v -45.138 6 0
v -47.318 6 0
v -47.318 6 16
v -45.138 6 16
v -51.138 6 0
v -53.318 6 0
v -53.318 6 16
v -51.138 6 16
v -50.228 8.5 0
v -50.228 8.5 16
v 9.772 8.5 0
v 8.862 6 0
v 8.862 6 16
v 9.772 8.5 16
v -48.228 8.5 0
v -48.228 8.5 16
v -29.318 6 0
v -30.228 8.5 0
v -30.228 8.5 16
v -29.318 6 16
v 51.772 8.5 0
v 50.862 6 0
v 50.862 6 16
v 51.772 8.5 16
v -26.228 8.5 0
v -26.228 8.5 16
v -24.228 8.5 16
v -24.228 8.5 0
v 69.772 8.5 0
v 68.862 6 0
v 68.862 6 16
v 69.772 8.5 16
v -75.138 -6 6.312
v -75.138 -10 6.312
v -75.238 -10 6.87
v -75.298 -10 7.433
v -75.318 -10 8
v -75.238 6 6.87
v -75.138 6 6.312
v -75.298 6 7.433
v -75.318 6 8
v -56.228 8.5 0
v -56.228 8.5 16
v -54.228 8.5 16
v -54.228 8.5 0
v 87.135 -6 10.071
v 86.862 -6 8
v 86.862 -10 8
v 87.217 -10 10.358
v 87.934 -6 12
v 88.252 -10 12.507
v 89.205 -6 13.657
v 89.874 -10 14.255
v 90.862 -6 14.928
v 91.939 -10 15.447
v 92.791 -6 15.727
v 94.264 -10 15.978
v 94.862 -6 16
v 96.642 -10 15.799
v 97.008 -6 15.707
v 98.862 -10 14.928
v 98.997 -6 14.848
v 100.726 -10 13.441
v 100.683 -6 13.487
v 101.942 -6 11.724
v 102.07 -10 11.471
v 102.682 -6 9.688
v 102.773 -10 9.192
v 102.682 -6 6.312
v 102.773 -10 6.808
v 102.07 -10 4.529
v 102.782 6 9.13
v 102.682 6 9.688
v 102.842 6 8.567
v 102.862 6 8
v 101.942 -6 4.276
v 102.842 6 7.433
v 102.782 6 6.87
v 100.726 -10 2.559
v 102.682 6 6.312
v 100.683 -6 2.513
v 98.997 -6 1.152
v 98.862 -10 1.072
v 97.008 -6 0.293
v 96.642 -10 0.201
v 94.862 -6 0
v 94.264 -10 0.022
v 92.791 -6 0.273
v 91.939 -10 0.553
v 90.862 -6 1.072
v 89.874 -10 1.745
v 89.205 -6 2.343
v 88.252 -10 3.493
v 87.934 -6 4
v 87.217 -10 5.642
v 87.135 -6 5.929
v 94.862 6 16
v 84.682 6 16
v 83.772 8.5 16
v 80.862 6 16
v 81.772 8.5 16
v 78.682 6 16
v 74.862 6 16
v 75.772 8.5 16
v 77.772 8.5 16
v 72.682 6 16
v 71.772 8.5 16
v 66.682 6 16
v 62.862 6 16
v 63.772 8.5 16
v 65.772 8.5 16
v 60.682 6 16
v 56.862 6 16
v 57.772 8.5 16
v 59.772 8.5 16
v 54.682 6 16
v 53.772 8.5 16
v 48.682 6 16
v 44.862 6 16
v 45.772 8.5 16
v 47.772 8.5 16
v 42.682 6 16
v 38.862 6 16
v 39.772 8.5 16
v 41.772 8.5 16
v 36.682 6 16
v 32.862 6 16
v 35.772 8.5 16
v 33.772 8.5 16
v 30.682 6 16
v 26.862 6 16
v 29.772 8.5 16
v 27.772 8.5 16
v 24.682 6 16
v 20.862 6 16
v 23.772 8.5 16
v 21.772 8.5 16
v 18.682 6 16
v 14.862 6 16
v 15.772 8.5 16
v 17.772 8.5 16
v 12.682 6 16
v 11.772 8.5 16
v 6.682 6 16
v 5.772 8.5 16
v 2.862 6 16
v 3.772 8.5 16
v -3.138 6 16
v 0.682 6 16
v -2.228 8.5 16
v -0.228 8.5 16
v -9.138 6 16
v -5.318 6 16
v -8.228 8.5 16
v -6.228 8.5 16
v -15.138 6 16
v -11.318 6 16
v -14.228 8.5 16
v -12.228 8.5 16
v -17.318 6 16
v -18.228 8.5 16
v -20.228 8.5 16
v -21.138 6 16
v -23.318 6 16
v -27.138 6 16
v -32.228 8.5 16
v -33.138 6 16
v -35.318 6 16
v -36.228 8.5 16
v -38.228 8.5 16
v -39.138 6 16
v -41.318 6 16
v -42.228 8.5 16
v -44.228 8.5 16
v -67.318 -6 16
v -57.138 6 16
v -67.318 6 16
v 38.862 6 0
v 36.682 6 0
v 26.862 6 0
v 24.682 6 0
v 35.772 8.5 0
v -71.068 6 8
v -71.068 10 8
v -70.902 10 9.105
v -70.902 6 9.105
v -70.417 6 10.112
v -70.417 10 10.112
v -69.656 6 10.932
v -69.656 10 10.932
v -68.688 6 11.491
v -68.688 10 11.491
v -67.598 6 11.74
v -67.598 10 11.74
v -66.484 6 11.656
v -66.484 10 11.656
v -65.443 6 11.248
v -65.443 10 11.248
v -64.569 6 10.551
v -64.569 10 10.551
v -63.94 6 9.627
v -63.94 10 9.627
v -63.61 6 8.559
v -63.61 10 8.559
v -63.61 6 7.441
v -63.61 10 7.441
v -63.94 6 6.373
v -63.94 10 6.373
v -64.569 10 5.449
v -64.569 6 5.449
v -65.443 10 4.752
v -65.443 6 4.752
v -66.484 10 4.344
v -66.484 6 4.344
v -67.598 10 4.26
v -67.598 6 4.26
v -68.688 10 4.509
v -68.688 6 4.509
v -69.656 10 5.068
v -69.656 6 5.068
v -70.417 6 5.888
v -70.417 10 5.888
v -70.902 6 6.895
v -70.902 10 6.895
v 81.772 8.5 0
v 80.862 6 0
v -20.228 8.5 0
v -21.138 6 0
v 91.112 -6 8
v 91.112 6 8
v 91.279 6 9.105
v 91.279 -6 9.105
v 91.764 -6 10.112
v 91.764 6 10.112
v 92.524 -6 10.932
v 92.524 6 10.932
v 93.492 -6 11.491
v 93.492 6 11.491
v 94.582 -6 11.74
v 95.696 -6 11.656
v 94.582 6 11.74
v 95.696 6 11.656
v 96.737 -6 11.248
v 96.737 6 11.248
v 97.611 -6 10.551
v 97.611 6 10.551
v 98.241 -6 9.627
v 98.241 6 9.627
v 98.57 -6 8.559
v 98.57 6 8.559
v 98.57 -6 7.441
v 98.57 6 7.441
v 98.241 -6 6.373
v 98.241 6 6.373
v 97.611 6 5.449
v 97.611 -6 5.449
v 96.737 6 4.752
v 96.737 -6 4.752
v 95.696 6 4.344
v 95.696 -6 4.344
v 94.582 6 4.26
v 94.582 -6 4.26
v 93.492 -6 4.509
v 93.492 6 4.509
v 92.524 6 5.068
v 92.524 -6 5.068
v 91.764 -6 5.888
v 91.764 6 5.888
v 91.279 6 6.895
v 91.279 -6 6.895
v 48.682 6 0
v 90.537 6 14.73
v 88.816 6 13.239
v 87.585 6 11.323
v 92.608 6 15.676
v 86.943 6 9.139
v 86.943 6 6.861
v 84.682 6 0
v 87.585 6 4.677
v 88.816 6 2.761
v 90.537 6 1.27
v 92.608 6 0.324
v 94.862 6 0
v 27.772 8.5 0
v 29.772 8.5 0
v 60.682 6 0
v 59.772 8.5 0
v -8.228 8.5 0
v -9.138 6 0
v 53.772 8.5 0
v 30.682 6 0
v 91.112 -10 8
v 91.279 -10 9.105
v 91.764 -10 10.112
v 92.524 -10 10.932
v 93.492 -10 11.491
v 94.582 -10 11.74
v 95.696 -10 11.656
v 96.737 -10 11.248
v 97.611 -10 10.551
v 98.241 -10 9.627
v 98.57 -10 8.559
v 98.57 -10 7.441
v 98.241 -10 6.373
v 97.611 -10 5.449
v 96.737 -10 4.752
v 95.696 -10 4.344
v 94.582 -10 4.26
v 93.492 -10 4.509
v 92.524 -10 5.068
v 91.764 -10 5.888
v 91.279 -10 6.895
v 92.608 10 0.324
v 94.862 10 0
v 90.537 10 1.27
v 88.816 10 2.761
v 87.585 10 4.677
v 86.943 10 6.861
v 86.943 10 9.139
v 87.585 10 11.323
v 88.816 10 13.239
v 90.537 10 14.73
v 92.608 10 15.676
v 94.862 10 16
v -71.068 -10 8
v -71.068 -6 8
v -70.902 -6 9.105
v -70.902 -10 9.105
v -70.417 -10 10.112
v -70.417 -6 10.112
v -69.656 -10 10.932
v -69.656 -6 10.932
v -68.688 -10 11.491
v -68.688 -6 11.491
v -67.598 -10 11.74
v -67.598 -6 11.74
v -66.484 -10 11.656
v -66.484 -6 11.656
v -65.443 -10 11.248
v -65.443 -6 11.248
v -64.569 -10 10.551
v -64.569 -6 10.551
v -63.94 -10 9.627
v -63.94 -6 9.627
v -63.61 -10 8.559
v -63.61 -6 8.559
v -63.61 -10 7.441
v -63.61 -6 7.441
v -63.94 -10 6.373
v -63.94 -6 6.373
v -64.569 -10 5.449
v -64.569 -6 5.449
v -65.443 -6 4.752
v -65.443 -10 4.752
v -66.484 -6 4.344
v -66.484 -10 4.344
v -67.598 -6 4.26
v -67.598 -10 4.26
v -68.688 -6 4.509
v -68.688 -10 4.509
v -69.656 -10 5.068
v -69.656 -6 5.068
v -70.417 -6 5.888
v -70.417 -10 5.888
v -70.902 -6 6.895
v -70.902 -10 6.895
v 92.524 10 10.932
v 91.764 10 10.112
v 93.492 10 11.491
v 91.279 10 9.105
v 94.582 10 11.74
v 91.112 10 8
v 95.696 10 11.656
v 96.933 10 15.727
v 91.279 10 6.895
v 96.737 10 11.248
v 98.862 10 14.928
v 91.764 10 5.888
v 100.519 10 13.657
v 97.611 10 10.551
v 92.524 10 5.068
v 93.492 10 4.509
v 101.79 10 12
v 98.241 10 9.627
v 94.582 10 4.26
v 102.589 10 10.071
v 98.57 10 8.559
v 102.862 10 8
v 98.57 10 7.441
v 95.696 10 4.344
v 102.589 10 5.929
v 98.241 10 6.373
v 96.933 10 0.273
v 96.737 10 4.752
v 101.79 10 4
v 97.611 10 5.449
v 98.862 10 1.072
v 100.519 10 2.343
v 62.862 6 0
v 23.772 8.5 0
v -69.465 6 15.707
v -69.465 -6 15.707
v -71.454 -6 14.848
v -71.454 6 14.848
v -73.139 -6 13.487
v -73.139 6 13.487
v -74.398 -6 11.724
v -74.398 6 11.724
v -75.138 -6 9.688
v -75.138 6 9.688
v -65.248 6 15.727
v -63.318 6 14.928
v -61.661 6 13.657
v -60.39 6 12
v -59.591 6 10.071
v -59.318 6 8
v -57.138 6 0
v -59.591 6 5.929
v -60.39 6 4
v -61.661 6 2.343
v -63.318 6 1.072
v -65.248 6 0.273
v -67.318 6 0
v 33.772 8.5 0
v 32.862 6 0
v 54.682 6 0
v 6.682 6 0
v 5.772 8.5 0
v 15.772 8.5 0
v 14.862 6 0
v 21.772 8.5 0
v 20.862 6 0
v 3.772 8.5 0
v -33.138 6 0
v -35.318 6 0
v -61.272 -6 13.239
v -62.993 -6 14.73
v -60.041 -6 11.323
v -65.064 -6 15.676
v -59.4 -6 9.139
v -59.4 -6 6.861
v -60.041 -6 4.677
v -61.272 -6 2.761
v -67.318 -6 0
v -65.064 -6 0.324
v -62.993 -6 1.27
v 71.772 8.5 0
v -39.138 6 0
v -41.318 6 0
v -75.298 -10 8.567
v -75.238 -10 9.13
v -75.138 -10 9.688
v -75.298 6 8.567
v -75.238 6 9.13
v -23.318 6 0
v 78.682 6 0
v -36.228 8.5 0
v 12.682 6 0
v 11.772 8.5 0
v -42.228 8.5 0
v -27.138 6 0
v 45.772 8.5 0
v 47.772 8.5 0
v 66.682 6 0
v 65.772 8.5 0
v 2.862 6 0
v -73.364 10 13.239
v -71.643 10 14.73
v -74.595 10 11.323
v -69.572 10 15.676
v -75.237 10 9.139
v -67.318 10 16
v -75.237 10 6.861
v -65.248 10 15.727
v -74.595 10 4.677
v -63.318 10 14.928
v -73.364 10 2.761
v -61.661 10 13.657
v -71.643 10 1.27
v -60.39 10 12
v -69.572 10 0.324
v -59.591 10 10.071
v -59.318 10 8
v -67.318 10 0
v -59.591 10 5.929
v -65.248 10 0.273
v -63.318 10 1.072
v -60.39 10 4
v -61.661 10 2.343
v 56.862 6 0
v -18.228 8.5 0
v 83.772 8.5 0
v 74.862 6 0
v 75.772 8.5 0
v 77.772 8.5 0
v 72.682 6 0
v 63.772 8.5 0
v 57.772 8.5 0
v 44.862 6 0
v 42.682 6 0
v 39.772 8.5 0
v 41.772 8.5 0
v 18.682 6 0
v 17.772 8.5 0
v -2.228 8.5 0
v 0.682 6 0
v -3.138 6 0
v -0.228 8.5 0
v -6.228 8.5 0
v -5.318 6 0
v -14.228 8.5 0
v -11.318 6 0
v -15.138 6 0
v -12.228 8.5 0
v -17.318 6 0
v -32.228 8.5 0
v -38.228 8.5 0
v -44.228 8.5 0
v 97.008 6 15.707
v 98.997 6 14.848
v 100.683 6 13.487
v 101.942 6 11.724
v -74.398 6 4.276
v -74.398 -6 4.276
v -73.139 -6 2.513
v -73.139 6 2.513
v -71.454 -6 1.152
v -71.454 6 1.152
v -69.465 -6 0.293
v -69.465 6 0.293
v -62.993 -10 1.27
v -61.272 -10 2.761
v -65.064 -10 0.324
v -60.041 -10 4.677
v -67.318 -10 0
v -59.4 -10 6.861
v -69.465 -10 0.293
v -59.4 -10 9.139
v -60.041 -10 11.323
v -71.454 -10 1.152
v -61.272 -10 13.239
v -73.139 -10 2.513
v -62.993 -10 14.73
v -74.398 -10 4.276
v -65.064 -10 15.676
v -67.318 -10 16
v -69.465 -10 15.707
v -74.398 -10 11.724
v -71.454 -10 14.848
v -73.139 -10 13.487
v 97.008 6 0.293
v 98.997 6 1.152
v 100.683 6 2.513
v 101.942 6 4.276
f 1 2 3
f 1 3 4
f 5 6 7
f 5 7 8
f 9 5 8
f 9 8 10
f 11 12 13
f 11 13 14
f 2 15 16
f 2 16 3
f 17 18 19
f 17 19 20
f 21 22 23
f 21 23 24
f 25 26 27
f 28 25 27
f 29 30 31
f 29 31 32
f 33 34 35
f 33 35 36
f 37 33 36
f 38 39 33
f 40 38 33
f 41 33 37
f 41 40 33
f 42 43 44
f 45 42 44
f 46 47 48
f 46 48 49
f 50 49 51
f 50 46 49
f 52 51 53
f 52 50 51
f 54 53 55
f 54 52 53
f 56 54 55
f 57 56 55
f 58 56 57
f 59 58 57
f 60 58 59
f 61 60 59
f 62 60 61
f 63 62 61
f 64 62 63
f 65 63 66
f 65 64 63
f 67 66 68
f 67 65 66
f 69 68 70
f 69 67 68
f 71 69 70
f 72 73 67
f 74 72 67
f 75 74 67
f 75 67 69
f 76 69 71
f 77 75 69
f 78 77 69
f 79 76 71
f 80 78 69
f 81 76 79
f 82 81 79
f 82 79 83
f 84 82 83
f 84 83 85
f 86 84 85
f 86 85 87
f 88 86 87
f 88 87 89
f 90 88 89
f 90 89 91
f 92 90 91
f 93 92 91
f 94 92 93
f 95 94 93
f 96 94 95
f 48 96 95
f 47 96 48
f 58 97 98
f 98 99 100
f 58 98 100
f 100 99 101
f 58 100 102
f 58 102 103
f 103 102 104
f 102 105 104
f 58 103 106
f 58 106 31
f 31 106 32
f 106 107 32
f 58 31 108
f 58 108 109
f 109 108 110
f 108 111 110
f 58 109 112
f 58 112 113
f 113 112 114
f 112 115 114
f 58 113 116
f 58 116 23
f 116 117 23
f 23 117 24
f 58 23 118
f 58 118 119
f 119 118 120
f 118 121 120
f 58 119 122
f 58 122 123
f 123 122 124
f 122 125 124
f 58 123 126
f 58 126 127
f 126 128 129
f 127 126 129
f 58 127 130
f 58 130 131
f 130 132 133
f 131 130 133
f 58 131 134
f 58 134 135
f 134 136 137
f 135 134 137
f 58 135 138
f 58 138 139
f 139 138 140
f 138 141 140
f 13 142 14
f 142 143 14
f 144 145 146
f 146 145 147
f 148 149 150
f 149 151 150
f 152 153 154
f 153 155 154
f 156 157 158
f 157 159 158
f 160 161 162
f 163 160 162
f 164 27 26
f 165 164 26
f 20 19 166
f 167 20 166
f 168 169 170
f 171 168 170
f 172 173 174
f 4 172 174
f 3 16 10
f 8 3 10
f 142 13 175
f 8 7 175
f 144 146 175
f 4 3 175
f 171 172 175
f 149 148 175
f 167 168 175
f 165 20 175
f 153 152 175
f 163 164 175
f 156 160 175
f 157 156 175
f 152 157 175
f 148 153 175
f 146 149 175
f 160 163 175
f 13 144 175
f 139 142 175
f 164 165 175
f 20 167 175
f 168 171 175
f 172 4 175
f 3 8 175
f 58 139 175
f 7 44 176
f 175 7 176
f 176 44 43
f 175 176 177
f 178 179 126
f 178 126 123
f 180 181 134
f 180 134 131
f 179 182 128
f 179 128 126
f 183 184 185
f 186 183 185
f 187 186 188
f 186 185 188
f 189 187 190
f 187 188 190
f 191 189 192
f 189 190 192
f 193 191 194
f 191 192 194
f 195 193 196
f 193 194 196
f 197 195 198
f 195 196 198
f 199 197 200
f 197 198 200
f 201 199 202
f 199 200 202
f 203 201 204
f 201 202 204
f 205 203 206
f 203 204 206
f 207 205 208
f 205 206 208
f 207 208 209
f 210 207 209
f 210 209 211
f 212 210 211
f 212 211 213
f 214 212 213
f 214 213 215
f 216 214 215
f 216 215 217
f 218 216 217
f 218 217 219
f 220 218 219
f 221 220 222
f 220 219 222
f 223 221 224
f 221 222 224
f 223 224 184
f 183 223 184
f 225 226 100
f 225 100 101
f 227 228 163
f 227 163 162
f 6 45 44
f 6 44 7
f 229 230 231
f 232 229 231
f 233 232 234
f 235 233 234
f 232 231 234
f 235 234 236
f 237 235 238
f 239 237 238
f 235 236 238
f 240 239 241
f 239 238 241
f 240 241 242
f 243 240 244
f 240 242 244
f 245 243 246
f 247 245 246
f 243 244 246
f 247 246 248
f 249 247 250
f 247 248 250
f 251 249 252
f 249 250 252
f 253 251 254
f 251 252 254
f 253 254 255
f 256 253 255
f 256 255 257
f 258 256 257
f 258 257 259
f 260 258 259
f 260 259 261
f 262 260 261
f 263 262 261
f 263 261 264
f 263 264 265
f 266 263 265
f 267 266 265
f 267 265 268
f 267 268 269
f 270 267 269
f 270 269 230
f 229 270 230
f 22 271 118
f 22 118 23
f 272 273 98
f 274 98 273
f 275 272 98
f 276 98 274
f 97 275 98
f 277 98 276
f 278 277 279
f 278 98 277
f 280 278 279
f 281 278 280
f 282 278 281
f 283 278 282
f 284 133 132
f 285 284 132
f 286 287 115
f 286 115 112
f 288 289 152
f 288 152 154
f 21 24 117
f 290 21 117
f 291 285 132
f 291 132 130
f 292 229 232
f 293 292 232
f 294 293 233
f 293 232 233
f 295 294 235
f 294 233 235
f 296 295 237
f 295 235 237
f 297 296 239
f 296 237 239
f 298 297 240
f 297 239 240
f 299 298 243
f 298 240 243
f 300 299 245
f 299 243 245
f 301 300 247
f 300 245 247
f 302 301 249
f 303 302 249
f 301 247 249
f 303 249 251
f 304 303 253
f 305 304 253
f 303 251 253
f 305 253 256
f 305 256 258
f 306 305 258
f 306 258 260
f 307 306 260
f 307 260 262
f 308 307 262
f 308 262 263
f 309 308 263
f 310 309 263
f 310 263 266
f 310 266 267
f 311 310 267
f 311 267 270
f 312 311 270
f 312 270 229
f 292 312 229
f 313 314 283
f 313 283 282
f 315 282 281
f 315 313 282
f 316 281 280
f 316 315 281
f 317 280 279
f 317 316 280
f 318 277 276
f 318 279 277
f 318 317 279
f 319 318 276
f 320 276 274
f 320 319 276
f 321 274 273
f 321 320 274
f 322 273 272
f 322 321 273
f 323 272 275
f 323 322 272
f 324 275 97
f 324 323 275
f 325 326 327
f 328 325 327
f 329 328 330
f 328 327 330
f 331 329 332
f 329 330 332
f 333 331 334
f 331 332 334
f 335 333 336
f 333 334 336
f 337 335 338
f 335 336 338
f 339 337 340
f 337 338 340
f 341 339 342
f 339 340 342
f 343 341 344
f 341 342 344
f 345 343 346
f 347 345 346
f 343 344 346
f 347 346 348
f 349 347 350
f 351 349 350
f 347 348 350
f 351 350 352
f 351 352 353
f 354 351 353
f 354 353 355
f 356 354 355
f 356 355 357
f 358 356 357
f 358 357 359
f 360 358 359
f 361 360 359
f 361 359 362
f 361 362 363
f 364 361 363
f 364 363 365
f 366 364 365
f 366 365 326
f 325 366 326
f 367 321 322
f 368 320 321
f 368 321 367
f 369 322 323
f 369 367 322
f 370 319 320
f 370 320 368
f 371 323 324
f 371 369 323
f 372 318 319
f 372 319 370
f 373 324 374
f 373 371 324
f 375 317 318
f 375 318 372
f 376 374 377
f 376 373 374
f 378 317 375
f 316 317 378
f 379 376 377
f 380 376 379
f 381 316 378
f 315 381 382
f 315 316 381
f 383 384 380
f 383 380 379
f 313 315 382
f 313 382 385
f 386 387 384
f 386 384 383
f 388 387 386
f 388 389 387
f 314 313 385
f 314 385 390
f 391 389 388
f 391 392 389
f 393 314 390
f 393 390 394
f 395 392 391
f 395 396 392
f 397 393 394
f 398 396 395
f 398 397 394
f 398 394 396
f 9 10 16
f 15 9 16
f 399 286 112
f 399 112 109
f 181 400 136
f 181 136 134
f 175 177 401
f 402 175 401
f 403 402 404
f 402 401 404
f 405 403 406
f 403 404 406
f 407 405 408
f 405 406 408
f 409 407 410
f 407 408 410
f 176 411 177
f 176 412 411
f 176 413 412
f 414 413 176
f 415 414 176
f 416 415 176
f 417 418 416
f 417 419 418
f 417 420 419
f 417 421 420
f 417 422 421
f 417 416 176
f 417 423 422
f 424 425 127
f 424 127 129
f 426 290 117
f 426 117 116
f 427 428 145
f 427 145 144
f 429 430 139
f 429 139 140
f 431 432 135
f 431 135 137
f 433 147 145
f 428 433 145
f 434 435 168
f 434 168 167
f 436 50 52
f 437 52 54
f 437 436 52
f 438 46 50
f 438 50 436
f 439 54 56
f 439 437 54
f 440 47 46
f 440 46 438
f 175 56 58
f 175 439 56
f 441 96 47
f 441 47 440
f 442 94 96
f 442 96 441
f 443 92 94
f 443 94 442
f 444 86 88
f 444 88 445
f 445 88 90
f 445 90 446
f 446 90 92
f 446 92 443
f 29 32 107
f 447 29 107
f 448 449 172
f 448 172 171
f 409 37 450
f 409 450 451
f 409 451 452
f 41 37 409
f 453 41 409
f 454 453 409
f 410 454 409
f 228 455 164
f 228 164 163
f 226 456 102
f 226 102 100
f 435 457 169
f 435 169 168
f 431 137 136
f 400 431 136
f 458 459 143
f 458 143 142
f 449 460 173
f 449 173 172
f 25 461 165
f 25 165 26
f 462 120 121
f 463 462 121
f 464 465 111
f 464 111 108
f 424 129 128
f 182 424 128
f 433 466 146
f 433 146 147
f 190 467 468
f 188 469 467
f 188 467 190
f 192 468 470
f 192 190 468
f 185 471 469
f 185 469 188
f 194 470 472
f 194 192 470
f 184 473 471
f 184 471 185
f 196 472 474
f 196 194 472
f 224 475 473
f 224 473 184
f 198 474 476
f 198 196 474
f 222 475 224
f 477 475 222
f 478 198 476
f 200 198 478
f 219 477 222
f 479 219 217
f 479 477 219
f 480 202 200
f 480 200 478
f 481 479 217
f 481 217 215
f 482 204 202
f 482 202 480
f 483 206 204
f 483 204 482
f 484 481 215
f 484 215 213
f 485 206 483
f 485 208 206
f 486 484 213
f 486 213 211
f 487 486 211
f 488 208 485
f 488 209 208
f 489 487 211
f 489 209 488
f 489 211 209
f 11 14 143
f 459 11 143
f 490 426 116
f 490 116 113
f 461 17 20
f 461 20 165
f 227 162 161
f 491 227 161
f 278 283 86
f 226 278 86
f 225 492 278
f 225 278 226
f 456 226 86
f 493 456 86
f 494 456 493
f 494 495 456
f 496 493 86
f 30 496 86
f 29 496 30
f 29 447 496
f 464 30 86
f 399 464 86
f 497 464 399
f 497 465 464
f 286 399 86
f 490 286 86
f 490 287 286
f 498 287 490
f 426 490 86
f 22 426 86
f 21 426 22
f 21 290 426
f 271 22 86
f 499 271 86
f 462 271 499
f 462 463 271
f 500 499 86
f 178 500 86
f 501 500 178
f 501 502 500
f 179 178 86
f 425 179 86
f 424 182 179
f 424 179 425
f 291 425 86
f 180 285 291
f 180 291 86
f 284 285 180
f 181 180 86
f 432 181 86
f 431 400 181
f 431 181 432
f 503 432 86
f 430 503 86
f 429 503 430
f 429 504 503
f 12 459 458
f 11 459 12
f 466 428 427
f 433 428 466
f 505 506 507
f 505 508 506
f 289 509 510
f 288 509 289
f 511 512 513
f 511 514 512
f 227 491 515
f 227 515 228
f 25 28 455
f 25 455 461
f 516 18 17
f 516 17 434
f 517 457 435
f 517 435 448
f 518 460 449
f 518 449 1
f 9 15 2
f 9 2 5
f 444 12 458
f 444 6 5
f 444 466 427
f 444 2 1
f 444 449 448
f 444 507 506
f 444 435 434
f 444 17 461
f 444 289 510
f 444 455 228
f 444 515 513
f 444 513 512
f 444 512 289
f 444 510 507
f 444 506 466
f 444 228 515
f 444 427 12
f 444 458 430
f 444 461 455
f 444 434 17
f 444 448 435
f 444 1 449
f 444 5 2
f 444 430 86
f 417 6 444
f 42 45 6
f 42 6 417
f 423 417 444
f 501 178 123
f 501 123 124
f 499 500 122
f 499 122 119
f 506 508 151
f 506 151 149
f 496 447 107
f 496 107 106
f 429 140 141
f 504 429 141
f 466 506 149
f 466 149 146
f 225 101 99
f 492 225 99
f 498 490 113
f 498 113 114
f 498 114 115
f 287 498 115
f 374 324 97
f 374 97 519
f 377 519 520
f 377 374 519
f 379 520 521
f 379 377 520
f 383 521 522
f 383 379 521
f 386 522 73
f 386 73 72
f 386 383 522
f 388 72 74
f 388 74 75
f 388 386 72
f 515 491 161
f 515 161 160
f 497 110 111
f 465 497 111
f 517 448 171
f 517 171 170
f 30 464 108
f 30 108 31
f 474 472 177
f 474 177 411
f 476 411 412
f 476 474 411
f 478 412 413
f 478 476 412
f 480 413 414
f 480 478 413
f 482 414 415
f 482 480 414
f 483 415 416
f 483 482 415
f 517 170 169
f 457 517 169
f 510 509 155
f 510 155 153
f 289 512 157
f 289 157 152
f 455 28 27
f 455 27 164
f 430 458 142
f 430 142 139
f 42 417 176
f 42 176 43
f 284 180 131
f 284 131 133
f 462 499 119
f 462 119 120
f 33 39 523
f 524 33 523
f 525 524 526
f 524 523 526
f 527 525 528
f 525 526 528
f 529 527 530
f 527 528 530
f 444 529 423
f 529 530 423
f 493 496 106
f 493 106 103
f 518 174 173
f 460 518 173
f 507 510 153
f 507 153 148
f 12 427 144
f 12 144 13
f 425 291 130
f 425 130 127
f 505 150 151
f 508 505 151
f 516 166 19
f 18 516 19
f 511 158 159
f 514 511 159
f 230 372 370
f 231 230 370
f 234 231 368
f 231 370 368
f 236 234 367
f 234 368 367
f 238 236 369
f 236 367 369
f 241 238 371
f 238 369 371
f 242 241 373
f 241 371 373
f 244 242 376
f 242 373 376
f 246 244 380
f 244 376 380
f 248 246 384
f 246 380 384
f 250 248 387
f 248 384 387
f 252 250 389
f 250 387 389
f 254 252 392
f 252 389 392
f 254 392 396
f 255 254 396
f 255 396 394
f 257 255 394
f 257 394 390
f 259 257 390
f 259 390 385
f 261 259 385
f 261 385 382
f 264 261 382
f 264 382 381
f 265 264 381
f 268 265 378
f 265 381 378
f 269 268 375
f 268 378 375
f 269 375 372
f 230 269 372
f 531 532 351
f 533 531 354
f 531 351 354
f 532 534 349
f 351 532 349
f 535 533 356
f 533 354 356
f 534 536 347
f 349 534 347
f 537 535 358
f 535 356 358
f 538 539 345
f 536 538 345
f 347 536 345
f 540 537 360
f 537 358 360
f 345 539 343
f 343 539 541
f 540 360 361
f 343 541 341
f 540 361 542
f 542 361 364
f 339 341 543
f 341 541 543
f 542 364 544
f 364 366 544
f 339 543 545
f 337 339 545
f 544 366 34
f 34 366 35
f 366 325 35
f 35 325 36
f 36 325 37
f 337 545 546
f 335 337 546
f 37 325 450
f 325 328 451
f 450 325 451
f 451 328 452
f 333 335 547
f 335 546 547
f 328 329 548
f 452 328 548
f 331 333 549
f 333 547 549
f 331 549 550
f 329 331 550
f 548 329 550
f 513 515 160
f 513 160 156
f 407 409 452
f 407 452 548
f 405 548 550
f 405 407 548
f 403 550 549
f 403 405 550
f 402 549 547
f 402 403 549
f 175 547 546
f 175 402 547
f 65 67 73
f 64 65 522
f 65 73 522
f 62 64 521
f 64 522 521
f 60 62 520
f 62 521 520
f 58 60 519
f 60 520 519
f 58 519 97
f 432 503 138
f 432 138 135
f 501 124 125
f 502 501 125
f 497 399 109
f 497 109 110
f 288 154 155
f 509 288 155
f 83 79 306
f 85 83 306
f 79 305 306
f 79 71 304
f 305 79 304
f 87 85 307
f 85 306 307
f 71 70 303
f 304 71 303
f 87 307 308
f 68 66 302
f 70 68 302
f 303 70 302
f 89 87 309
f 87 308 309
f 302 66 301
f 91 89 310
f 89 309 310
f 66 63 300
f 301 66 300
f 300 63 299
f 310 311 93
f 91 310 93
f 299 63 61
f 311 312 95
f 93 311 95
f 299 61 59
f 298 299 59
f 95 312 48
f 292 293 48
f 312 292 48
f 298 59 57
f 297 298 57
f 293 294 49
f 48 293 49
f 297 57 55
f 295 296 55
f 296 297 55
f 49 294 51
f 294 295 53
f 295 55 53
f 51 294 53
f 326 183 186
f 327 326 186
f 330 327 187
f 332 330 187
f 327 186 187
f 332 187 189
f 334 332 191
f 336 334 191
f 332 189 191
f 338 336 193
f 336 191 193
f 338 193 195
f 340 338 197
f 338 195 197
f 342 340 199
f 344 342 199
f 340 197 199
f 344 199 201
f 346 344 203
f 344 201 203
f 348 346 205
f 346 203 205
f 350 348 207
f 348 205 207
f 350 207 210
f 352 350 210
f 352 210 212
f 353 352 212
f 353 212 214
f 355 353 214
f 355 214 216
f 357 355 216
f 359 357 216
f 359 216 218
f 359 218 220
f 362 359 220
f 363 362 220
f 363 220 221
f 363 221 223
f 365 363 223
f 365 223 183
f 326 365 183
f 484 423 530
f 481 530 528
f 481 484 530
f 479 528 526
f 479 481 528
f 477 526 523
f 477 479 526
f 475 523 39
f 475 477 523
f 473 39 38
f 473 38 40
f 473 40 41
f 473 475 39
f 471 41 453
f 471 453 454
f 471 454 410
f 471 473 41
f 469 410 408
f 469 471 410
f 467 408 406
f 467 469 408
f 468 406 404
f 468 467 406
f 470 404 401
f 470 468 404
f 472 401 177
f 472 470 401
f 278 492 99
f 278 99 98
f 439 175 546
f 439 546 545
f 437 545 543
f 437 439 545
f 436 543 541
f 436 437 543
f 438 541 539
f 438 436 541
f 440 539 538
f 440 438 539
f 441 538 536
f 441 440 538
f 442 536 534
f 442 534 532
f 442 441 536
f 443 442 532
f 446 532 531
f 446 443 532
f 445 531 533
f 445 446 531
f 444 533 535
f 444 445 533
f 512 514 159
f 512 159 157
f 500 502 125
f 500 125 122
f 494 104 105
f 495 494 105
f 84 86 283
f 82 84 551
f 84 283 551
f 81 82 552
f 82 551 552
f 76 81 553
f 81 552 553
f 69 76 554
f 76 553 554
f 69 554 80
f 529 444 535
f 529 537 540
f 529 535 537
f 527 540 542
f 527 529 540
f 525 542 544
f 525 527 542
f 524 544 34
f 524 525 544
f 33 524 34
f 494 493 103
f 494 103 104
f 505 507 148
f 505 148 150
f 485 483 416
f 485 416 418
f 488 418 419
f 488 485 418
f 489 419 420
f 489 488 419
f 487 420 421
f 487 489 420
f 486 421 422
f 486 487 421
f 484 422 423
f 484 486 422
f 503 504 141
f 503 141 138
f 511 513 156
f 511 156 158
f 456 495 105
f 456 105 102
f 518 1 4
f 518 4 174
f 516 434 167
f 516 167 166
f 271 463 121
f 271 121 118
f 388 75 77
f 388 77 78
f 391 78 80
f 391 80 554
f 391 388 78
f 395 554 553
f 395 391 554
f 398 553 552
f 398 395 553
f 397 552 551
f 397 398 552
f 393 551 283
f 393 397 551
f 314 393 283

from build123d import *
from build123d.topology import SkipClean

# Parameters (mm, degrees)
BOSS_EXTRUDE1_DEPTH = 16
SKETCH3_R           = 3.75
CUT_EXTRUDE1_DEPTH  = 16
SKETCH4_R           = 8
SKETCH4_R_2         = 3.75
BOSS_EXTRUDE2_DEPTH = 16
BOSS_EXTRUDE3_START = 4
SKETCH5_R           = 3.75
BOSS_EXTRUDE3_DEPTH = 4
SKETCH6_R           = 8
SKETCH6_R_2         = 3.75
BOSS_EXTRUDE4_DEPTH = 16
SKETCH7_R           = 3.75
CUT_EXTRUDE2_DEPTH  = 16
BOSS_EXTRUDE5_START = 4
SKETCH8_R           = 3.75
BOSS_EXTRUDE5_DEPTH = 4


with BuildPart() as part:
    # Sketch1 → Boss-Extrude1 (new body)
    with BuildSketch(Plane.XY):
        Polygon((83.771892596, 8.5), (81.771892596, 8.5), (80.86196701, 6), (78.681818182, 6), (77.771892596, 8.5), (75.771892596, 8.5), (74.86196701, 6), (72.681818182, 6), (71.771892596, 8.5), (69.771892596, 8.5), (68.86196701, 6), (66.681818182, 6), (65.771892596, 8.5), (63.771892596, 8.5), (62.86196701, 6), (60.681818182, 6), (59.771892596, 8.5), (57.771892596, 8.5), (56.86196701, 6), (54.681818182, 6), (53.771892596, 8.5), (51.771892596, 8.5), (50.86196701, 6), (48.681818182, 6), (47.771892596, 8.5), (45.771892596, 8.5), (44.86196701, 6), (42.681818182, 6), (41.771892596, 8.5), (39.771892596, 8.5), (38.86196701, 6), (36.681818182, 6), (35.771892596, 8.5), (33.771892596, 8.5), (32.86196701, 6), (30.681818182, 6), (29.771892596, 8.5), (27.771892596, 8.5), (26.86196701, 6), (24.681818182, 6), (23.771892596, 8.5), (21.771892596, 8.5), (20.86196701, 6), (18.681818182, 6), (17.771892596, 8.5), (15.771892596, 8.5), (14.86196701, 6), (12.681818182, 6), (11.771892596, 8.5), (9.771892596, 8.5), (8.86196701, 6), (6.681818182, 6), (5.771892596, 8.5), (3.771892596, 8.5), (2.86196701, 6), (0.681818182, 6), (-0.228107404, 8.5), (-2.228107404, 8.5), (-3.13803299, 6), (-5.318181818, 6), (-6.228107404, 8.5), (-8.228107404, 8.5), (-9.13803299, 6), (-11.318181818, 6), (-12.228107404, 8.5), (-14.228107404, 8.5), (-15.13803299, 6), (-17.318181818, 6), (-18.228107404, 8.5), (-20.228107404, 8.5), (-21.13803299, 6), (-23.318181818, 6), (-24.228107404, 8.5), (-26.228107404, 8.5), (-27.13803299, 6), (-29.318181818, 6), (-30.228107404, 8.5), (-32.228107404, 8.5), (-33.13803299, 6), (-35.318181818, 6), (-36.228107404, 8.5), (-38.228107404, 8.5), (-39.13803299, 6), (-41.318181818, 6), (-42.228107404, 8.5), (-44.228107404, 8.5), (-45.13803299, 6), (-47.318181818, 6), (-48.228107404, 8.5), (-50.228107404, 8.5), (-51.13803299, 6), (-53.318181818, 6), (-54.228107404, 8.5), (-56.228107404, 8.5), (-57.13803299, 6), (-75.13803299, 6), (-75.13803299, -6), (102.681818182, -6), (102.681818182, 6), (84.681818182, 6), align=None)
    extrude(amount=BOSS_EXTRUDE1_DEPTH)

    # Sketch3 → Cut-Extrude1 (cut)
    with BuildSketch(Plane(origin=(0, 6, 0), x_dir=(1, 0, 0), z_dir=(0, 1, 0))):
        with BuildLine():
            ThreePointArc((94.86196701, 0), (102.86196701, -8), (94.86196701, -16))
            Line((94.86196701, -16), (91.310905943, -17.982667731))
            Line((91.310905943, -17.982667731), (106.371238817, -17.331958931))
            Line((106.371238817, -17.331958931), (104.42249812, 2.008331966))
            Line((104.42249812, 2.008331966), (94.86196701, 0))
        make_face()
        with Locations((94.86196701, -8)):
            Circle(SKETCH3_R)
    extrude(amount=-CUT_EXTRUDE1_DEPTH, mode=Mode.SUBTRACT)

    # Sketch4 → Boss-Extrude2 (add)
    with SkipClean():  # the faces are left unmerged after this step: merging them gives an invalid solid
        with BuildSketch(Plane(origin=(0, 6, 0), x_dir=(1, 0, 0), z_dir=(0, 1, 0))):
            with Locations((94.86196701, -8)):
                Circle(SKETCH4_R)
            with Locations((94.86196701, -8)):
                Circle(SKETCH4_R_2, mode=Mode.SUBTRACT)
        extrude(amount=-BOSS_EXTRUDE2_DEPTH)

    # Sketch5 → Boss-Extrude3 (add)
    with SkipClean():  # the faces are left unmerged after this step: merging them gives an invalid solid
        with BuildSketch(Plane(origin=(0, 6, 0), x_dir=(1, 0, 0), z_dir=(0, 1, 0)).offset(BOSS_EXTRUDE3_START)):
            with BuildLine():
                ThreePointArc((94.86196701, 0), (86.86196701, -8), (94.86196701, -16))
                ThreePointArc((94.86196701, -16), (100.51882126, -13.656854249), (102.86196701, -8))
                ThreePointArc((102.86196701, -8), (100.51882126, -2.343145751), (94.86196701, 0))
            make_face()
            with Locations((94.86196701, -8)):
                Circle(SKETCH5_R, mode=Mode.SUBTRACT)
        extrude(amount=-BOSS_EXTRUDE3_DEPTH)

    # Sketch6 → Boss-Extrude4 (add)
    with SkipClean():  # the faces are left unmerged after this step: merging them gives an invalid solid
        with BuildSketch(Plane(origin=(0, 6, 0), x_dir=(1, 0, 0), z_dir=(0, 1, 0))):
            with Locations((-67.318181818, -8)):
                Circle(SKETCH6_R)
            with Locations((-67.318181818, -8)):
                Circle(SKETCH6_R_2, mode=Mode.SUBTRACT)
        extrude(amount=-BOSS_EXTRUDE4_DEPTH)

    # Sketch7 → Cut-Extrude2 (cut)
    with SkipClean():  # the faces are left unmerged after this step: merging them gives an invalid solid
        with BuildSketch(Plane(origin=(0, 6, 0), x_dir=(1, 0, 0), z_dir=(0, 1, 0))):
            with BuildLine():
                Line((-67.318181818, 0), (-75.13803299, 0))
                Line((-75.13803299, 0), (-75.13803299, -6.311827124))
                ThreePointArc((-75.13803299, -6.311827124), (-72.342851807, -1.774834018), (-67.318181818, 0))
            make_face()
            with BuildLine():
                ThreePointArc((-67.318181818, -16), (-72.342851807, -14.225165982), (-75.13803299, -9.688172876))
                Line((-75.13803299, -9.688172876), (-75.13803299, -16))
                Line((-75.13803299, -16), (-67.318181818, -16))
            make_face()
            with Locations((-67.318181818, -8)):
                Circle(SKETCH7_R)
        extrude(amount=-CUT_EXTRUDE2_DEPTH, mode=Mode.SUBTRACT)

    # Sketch8 → Boss-Extrude5 (add)
    with SkipClean():  # the faces are left unmerged after this step: merging them gives an invalid solid
        with BuildSketch(Plane(origin=(0, 6, 0), x_dir=(1, 0, 0), z_dir=(0, 1, 0)).offset(BOSS_EXTRUDE5_START)):
            with BuildLine():
                ThreePointArc((-59.318181818, -8), (-61.661327569, -2.343145751), (-67.318181818, 0))
                ThreePointArc((-67.318181818, 0), (-75.318181818, -8), (-67.318181818, -16))
                ThreePointArc((-67.318181818, -16), (-61.661327569, -13.656854249), (-59.318181818, -8))
            make_face()
            with Locations((-67.318181818, -8)):
                Circle(SKETCH8_R, mode=Mode.SUBTRACT)
        extrude(amount=-BOSS_EXTRUDE5_DEPTH)


solid = part.part
